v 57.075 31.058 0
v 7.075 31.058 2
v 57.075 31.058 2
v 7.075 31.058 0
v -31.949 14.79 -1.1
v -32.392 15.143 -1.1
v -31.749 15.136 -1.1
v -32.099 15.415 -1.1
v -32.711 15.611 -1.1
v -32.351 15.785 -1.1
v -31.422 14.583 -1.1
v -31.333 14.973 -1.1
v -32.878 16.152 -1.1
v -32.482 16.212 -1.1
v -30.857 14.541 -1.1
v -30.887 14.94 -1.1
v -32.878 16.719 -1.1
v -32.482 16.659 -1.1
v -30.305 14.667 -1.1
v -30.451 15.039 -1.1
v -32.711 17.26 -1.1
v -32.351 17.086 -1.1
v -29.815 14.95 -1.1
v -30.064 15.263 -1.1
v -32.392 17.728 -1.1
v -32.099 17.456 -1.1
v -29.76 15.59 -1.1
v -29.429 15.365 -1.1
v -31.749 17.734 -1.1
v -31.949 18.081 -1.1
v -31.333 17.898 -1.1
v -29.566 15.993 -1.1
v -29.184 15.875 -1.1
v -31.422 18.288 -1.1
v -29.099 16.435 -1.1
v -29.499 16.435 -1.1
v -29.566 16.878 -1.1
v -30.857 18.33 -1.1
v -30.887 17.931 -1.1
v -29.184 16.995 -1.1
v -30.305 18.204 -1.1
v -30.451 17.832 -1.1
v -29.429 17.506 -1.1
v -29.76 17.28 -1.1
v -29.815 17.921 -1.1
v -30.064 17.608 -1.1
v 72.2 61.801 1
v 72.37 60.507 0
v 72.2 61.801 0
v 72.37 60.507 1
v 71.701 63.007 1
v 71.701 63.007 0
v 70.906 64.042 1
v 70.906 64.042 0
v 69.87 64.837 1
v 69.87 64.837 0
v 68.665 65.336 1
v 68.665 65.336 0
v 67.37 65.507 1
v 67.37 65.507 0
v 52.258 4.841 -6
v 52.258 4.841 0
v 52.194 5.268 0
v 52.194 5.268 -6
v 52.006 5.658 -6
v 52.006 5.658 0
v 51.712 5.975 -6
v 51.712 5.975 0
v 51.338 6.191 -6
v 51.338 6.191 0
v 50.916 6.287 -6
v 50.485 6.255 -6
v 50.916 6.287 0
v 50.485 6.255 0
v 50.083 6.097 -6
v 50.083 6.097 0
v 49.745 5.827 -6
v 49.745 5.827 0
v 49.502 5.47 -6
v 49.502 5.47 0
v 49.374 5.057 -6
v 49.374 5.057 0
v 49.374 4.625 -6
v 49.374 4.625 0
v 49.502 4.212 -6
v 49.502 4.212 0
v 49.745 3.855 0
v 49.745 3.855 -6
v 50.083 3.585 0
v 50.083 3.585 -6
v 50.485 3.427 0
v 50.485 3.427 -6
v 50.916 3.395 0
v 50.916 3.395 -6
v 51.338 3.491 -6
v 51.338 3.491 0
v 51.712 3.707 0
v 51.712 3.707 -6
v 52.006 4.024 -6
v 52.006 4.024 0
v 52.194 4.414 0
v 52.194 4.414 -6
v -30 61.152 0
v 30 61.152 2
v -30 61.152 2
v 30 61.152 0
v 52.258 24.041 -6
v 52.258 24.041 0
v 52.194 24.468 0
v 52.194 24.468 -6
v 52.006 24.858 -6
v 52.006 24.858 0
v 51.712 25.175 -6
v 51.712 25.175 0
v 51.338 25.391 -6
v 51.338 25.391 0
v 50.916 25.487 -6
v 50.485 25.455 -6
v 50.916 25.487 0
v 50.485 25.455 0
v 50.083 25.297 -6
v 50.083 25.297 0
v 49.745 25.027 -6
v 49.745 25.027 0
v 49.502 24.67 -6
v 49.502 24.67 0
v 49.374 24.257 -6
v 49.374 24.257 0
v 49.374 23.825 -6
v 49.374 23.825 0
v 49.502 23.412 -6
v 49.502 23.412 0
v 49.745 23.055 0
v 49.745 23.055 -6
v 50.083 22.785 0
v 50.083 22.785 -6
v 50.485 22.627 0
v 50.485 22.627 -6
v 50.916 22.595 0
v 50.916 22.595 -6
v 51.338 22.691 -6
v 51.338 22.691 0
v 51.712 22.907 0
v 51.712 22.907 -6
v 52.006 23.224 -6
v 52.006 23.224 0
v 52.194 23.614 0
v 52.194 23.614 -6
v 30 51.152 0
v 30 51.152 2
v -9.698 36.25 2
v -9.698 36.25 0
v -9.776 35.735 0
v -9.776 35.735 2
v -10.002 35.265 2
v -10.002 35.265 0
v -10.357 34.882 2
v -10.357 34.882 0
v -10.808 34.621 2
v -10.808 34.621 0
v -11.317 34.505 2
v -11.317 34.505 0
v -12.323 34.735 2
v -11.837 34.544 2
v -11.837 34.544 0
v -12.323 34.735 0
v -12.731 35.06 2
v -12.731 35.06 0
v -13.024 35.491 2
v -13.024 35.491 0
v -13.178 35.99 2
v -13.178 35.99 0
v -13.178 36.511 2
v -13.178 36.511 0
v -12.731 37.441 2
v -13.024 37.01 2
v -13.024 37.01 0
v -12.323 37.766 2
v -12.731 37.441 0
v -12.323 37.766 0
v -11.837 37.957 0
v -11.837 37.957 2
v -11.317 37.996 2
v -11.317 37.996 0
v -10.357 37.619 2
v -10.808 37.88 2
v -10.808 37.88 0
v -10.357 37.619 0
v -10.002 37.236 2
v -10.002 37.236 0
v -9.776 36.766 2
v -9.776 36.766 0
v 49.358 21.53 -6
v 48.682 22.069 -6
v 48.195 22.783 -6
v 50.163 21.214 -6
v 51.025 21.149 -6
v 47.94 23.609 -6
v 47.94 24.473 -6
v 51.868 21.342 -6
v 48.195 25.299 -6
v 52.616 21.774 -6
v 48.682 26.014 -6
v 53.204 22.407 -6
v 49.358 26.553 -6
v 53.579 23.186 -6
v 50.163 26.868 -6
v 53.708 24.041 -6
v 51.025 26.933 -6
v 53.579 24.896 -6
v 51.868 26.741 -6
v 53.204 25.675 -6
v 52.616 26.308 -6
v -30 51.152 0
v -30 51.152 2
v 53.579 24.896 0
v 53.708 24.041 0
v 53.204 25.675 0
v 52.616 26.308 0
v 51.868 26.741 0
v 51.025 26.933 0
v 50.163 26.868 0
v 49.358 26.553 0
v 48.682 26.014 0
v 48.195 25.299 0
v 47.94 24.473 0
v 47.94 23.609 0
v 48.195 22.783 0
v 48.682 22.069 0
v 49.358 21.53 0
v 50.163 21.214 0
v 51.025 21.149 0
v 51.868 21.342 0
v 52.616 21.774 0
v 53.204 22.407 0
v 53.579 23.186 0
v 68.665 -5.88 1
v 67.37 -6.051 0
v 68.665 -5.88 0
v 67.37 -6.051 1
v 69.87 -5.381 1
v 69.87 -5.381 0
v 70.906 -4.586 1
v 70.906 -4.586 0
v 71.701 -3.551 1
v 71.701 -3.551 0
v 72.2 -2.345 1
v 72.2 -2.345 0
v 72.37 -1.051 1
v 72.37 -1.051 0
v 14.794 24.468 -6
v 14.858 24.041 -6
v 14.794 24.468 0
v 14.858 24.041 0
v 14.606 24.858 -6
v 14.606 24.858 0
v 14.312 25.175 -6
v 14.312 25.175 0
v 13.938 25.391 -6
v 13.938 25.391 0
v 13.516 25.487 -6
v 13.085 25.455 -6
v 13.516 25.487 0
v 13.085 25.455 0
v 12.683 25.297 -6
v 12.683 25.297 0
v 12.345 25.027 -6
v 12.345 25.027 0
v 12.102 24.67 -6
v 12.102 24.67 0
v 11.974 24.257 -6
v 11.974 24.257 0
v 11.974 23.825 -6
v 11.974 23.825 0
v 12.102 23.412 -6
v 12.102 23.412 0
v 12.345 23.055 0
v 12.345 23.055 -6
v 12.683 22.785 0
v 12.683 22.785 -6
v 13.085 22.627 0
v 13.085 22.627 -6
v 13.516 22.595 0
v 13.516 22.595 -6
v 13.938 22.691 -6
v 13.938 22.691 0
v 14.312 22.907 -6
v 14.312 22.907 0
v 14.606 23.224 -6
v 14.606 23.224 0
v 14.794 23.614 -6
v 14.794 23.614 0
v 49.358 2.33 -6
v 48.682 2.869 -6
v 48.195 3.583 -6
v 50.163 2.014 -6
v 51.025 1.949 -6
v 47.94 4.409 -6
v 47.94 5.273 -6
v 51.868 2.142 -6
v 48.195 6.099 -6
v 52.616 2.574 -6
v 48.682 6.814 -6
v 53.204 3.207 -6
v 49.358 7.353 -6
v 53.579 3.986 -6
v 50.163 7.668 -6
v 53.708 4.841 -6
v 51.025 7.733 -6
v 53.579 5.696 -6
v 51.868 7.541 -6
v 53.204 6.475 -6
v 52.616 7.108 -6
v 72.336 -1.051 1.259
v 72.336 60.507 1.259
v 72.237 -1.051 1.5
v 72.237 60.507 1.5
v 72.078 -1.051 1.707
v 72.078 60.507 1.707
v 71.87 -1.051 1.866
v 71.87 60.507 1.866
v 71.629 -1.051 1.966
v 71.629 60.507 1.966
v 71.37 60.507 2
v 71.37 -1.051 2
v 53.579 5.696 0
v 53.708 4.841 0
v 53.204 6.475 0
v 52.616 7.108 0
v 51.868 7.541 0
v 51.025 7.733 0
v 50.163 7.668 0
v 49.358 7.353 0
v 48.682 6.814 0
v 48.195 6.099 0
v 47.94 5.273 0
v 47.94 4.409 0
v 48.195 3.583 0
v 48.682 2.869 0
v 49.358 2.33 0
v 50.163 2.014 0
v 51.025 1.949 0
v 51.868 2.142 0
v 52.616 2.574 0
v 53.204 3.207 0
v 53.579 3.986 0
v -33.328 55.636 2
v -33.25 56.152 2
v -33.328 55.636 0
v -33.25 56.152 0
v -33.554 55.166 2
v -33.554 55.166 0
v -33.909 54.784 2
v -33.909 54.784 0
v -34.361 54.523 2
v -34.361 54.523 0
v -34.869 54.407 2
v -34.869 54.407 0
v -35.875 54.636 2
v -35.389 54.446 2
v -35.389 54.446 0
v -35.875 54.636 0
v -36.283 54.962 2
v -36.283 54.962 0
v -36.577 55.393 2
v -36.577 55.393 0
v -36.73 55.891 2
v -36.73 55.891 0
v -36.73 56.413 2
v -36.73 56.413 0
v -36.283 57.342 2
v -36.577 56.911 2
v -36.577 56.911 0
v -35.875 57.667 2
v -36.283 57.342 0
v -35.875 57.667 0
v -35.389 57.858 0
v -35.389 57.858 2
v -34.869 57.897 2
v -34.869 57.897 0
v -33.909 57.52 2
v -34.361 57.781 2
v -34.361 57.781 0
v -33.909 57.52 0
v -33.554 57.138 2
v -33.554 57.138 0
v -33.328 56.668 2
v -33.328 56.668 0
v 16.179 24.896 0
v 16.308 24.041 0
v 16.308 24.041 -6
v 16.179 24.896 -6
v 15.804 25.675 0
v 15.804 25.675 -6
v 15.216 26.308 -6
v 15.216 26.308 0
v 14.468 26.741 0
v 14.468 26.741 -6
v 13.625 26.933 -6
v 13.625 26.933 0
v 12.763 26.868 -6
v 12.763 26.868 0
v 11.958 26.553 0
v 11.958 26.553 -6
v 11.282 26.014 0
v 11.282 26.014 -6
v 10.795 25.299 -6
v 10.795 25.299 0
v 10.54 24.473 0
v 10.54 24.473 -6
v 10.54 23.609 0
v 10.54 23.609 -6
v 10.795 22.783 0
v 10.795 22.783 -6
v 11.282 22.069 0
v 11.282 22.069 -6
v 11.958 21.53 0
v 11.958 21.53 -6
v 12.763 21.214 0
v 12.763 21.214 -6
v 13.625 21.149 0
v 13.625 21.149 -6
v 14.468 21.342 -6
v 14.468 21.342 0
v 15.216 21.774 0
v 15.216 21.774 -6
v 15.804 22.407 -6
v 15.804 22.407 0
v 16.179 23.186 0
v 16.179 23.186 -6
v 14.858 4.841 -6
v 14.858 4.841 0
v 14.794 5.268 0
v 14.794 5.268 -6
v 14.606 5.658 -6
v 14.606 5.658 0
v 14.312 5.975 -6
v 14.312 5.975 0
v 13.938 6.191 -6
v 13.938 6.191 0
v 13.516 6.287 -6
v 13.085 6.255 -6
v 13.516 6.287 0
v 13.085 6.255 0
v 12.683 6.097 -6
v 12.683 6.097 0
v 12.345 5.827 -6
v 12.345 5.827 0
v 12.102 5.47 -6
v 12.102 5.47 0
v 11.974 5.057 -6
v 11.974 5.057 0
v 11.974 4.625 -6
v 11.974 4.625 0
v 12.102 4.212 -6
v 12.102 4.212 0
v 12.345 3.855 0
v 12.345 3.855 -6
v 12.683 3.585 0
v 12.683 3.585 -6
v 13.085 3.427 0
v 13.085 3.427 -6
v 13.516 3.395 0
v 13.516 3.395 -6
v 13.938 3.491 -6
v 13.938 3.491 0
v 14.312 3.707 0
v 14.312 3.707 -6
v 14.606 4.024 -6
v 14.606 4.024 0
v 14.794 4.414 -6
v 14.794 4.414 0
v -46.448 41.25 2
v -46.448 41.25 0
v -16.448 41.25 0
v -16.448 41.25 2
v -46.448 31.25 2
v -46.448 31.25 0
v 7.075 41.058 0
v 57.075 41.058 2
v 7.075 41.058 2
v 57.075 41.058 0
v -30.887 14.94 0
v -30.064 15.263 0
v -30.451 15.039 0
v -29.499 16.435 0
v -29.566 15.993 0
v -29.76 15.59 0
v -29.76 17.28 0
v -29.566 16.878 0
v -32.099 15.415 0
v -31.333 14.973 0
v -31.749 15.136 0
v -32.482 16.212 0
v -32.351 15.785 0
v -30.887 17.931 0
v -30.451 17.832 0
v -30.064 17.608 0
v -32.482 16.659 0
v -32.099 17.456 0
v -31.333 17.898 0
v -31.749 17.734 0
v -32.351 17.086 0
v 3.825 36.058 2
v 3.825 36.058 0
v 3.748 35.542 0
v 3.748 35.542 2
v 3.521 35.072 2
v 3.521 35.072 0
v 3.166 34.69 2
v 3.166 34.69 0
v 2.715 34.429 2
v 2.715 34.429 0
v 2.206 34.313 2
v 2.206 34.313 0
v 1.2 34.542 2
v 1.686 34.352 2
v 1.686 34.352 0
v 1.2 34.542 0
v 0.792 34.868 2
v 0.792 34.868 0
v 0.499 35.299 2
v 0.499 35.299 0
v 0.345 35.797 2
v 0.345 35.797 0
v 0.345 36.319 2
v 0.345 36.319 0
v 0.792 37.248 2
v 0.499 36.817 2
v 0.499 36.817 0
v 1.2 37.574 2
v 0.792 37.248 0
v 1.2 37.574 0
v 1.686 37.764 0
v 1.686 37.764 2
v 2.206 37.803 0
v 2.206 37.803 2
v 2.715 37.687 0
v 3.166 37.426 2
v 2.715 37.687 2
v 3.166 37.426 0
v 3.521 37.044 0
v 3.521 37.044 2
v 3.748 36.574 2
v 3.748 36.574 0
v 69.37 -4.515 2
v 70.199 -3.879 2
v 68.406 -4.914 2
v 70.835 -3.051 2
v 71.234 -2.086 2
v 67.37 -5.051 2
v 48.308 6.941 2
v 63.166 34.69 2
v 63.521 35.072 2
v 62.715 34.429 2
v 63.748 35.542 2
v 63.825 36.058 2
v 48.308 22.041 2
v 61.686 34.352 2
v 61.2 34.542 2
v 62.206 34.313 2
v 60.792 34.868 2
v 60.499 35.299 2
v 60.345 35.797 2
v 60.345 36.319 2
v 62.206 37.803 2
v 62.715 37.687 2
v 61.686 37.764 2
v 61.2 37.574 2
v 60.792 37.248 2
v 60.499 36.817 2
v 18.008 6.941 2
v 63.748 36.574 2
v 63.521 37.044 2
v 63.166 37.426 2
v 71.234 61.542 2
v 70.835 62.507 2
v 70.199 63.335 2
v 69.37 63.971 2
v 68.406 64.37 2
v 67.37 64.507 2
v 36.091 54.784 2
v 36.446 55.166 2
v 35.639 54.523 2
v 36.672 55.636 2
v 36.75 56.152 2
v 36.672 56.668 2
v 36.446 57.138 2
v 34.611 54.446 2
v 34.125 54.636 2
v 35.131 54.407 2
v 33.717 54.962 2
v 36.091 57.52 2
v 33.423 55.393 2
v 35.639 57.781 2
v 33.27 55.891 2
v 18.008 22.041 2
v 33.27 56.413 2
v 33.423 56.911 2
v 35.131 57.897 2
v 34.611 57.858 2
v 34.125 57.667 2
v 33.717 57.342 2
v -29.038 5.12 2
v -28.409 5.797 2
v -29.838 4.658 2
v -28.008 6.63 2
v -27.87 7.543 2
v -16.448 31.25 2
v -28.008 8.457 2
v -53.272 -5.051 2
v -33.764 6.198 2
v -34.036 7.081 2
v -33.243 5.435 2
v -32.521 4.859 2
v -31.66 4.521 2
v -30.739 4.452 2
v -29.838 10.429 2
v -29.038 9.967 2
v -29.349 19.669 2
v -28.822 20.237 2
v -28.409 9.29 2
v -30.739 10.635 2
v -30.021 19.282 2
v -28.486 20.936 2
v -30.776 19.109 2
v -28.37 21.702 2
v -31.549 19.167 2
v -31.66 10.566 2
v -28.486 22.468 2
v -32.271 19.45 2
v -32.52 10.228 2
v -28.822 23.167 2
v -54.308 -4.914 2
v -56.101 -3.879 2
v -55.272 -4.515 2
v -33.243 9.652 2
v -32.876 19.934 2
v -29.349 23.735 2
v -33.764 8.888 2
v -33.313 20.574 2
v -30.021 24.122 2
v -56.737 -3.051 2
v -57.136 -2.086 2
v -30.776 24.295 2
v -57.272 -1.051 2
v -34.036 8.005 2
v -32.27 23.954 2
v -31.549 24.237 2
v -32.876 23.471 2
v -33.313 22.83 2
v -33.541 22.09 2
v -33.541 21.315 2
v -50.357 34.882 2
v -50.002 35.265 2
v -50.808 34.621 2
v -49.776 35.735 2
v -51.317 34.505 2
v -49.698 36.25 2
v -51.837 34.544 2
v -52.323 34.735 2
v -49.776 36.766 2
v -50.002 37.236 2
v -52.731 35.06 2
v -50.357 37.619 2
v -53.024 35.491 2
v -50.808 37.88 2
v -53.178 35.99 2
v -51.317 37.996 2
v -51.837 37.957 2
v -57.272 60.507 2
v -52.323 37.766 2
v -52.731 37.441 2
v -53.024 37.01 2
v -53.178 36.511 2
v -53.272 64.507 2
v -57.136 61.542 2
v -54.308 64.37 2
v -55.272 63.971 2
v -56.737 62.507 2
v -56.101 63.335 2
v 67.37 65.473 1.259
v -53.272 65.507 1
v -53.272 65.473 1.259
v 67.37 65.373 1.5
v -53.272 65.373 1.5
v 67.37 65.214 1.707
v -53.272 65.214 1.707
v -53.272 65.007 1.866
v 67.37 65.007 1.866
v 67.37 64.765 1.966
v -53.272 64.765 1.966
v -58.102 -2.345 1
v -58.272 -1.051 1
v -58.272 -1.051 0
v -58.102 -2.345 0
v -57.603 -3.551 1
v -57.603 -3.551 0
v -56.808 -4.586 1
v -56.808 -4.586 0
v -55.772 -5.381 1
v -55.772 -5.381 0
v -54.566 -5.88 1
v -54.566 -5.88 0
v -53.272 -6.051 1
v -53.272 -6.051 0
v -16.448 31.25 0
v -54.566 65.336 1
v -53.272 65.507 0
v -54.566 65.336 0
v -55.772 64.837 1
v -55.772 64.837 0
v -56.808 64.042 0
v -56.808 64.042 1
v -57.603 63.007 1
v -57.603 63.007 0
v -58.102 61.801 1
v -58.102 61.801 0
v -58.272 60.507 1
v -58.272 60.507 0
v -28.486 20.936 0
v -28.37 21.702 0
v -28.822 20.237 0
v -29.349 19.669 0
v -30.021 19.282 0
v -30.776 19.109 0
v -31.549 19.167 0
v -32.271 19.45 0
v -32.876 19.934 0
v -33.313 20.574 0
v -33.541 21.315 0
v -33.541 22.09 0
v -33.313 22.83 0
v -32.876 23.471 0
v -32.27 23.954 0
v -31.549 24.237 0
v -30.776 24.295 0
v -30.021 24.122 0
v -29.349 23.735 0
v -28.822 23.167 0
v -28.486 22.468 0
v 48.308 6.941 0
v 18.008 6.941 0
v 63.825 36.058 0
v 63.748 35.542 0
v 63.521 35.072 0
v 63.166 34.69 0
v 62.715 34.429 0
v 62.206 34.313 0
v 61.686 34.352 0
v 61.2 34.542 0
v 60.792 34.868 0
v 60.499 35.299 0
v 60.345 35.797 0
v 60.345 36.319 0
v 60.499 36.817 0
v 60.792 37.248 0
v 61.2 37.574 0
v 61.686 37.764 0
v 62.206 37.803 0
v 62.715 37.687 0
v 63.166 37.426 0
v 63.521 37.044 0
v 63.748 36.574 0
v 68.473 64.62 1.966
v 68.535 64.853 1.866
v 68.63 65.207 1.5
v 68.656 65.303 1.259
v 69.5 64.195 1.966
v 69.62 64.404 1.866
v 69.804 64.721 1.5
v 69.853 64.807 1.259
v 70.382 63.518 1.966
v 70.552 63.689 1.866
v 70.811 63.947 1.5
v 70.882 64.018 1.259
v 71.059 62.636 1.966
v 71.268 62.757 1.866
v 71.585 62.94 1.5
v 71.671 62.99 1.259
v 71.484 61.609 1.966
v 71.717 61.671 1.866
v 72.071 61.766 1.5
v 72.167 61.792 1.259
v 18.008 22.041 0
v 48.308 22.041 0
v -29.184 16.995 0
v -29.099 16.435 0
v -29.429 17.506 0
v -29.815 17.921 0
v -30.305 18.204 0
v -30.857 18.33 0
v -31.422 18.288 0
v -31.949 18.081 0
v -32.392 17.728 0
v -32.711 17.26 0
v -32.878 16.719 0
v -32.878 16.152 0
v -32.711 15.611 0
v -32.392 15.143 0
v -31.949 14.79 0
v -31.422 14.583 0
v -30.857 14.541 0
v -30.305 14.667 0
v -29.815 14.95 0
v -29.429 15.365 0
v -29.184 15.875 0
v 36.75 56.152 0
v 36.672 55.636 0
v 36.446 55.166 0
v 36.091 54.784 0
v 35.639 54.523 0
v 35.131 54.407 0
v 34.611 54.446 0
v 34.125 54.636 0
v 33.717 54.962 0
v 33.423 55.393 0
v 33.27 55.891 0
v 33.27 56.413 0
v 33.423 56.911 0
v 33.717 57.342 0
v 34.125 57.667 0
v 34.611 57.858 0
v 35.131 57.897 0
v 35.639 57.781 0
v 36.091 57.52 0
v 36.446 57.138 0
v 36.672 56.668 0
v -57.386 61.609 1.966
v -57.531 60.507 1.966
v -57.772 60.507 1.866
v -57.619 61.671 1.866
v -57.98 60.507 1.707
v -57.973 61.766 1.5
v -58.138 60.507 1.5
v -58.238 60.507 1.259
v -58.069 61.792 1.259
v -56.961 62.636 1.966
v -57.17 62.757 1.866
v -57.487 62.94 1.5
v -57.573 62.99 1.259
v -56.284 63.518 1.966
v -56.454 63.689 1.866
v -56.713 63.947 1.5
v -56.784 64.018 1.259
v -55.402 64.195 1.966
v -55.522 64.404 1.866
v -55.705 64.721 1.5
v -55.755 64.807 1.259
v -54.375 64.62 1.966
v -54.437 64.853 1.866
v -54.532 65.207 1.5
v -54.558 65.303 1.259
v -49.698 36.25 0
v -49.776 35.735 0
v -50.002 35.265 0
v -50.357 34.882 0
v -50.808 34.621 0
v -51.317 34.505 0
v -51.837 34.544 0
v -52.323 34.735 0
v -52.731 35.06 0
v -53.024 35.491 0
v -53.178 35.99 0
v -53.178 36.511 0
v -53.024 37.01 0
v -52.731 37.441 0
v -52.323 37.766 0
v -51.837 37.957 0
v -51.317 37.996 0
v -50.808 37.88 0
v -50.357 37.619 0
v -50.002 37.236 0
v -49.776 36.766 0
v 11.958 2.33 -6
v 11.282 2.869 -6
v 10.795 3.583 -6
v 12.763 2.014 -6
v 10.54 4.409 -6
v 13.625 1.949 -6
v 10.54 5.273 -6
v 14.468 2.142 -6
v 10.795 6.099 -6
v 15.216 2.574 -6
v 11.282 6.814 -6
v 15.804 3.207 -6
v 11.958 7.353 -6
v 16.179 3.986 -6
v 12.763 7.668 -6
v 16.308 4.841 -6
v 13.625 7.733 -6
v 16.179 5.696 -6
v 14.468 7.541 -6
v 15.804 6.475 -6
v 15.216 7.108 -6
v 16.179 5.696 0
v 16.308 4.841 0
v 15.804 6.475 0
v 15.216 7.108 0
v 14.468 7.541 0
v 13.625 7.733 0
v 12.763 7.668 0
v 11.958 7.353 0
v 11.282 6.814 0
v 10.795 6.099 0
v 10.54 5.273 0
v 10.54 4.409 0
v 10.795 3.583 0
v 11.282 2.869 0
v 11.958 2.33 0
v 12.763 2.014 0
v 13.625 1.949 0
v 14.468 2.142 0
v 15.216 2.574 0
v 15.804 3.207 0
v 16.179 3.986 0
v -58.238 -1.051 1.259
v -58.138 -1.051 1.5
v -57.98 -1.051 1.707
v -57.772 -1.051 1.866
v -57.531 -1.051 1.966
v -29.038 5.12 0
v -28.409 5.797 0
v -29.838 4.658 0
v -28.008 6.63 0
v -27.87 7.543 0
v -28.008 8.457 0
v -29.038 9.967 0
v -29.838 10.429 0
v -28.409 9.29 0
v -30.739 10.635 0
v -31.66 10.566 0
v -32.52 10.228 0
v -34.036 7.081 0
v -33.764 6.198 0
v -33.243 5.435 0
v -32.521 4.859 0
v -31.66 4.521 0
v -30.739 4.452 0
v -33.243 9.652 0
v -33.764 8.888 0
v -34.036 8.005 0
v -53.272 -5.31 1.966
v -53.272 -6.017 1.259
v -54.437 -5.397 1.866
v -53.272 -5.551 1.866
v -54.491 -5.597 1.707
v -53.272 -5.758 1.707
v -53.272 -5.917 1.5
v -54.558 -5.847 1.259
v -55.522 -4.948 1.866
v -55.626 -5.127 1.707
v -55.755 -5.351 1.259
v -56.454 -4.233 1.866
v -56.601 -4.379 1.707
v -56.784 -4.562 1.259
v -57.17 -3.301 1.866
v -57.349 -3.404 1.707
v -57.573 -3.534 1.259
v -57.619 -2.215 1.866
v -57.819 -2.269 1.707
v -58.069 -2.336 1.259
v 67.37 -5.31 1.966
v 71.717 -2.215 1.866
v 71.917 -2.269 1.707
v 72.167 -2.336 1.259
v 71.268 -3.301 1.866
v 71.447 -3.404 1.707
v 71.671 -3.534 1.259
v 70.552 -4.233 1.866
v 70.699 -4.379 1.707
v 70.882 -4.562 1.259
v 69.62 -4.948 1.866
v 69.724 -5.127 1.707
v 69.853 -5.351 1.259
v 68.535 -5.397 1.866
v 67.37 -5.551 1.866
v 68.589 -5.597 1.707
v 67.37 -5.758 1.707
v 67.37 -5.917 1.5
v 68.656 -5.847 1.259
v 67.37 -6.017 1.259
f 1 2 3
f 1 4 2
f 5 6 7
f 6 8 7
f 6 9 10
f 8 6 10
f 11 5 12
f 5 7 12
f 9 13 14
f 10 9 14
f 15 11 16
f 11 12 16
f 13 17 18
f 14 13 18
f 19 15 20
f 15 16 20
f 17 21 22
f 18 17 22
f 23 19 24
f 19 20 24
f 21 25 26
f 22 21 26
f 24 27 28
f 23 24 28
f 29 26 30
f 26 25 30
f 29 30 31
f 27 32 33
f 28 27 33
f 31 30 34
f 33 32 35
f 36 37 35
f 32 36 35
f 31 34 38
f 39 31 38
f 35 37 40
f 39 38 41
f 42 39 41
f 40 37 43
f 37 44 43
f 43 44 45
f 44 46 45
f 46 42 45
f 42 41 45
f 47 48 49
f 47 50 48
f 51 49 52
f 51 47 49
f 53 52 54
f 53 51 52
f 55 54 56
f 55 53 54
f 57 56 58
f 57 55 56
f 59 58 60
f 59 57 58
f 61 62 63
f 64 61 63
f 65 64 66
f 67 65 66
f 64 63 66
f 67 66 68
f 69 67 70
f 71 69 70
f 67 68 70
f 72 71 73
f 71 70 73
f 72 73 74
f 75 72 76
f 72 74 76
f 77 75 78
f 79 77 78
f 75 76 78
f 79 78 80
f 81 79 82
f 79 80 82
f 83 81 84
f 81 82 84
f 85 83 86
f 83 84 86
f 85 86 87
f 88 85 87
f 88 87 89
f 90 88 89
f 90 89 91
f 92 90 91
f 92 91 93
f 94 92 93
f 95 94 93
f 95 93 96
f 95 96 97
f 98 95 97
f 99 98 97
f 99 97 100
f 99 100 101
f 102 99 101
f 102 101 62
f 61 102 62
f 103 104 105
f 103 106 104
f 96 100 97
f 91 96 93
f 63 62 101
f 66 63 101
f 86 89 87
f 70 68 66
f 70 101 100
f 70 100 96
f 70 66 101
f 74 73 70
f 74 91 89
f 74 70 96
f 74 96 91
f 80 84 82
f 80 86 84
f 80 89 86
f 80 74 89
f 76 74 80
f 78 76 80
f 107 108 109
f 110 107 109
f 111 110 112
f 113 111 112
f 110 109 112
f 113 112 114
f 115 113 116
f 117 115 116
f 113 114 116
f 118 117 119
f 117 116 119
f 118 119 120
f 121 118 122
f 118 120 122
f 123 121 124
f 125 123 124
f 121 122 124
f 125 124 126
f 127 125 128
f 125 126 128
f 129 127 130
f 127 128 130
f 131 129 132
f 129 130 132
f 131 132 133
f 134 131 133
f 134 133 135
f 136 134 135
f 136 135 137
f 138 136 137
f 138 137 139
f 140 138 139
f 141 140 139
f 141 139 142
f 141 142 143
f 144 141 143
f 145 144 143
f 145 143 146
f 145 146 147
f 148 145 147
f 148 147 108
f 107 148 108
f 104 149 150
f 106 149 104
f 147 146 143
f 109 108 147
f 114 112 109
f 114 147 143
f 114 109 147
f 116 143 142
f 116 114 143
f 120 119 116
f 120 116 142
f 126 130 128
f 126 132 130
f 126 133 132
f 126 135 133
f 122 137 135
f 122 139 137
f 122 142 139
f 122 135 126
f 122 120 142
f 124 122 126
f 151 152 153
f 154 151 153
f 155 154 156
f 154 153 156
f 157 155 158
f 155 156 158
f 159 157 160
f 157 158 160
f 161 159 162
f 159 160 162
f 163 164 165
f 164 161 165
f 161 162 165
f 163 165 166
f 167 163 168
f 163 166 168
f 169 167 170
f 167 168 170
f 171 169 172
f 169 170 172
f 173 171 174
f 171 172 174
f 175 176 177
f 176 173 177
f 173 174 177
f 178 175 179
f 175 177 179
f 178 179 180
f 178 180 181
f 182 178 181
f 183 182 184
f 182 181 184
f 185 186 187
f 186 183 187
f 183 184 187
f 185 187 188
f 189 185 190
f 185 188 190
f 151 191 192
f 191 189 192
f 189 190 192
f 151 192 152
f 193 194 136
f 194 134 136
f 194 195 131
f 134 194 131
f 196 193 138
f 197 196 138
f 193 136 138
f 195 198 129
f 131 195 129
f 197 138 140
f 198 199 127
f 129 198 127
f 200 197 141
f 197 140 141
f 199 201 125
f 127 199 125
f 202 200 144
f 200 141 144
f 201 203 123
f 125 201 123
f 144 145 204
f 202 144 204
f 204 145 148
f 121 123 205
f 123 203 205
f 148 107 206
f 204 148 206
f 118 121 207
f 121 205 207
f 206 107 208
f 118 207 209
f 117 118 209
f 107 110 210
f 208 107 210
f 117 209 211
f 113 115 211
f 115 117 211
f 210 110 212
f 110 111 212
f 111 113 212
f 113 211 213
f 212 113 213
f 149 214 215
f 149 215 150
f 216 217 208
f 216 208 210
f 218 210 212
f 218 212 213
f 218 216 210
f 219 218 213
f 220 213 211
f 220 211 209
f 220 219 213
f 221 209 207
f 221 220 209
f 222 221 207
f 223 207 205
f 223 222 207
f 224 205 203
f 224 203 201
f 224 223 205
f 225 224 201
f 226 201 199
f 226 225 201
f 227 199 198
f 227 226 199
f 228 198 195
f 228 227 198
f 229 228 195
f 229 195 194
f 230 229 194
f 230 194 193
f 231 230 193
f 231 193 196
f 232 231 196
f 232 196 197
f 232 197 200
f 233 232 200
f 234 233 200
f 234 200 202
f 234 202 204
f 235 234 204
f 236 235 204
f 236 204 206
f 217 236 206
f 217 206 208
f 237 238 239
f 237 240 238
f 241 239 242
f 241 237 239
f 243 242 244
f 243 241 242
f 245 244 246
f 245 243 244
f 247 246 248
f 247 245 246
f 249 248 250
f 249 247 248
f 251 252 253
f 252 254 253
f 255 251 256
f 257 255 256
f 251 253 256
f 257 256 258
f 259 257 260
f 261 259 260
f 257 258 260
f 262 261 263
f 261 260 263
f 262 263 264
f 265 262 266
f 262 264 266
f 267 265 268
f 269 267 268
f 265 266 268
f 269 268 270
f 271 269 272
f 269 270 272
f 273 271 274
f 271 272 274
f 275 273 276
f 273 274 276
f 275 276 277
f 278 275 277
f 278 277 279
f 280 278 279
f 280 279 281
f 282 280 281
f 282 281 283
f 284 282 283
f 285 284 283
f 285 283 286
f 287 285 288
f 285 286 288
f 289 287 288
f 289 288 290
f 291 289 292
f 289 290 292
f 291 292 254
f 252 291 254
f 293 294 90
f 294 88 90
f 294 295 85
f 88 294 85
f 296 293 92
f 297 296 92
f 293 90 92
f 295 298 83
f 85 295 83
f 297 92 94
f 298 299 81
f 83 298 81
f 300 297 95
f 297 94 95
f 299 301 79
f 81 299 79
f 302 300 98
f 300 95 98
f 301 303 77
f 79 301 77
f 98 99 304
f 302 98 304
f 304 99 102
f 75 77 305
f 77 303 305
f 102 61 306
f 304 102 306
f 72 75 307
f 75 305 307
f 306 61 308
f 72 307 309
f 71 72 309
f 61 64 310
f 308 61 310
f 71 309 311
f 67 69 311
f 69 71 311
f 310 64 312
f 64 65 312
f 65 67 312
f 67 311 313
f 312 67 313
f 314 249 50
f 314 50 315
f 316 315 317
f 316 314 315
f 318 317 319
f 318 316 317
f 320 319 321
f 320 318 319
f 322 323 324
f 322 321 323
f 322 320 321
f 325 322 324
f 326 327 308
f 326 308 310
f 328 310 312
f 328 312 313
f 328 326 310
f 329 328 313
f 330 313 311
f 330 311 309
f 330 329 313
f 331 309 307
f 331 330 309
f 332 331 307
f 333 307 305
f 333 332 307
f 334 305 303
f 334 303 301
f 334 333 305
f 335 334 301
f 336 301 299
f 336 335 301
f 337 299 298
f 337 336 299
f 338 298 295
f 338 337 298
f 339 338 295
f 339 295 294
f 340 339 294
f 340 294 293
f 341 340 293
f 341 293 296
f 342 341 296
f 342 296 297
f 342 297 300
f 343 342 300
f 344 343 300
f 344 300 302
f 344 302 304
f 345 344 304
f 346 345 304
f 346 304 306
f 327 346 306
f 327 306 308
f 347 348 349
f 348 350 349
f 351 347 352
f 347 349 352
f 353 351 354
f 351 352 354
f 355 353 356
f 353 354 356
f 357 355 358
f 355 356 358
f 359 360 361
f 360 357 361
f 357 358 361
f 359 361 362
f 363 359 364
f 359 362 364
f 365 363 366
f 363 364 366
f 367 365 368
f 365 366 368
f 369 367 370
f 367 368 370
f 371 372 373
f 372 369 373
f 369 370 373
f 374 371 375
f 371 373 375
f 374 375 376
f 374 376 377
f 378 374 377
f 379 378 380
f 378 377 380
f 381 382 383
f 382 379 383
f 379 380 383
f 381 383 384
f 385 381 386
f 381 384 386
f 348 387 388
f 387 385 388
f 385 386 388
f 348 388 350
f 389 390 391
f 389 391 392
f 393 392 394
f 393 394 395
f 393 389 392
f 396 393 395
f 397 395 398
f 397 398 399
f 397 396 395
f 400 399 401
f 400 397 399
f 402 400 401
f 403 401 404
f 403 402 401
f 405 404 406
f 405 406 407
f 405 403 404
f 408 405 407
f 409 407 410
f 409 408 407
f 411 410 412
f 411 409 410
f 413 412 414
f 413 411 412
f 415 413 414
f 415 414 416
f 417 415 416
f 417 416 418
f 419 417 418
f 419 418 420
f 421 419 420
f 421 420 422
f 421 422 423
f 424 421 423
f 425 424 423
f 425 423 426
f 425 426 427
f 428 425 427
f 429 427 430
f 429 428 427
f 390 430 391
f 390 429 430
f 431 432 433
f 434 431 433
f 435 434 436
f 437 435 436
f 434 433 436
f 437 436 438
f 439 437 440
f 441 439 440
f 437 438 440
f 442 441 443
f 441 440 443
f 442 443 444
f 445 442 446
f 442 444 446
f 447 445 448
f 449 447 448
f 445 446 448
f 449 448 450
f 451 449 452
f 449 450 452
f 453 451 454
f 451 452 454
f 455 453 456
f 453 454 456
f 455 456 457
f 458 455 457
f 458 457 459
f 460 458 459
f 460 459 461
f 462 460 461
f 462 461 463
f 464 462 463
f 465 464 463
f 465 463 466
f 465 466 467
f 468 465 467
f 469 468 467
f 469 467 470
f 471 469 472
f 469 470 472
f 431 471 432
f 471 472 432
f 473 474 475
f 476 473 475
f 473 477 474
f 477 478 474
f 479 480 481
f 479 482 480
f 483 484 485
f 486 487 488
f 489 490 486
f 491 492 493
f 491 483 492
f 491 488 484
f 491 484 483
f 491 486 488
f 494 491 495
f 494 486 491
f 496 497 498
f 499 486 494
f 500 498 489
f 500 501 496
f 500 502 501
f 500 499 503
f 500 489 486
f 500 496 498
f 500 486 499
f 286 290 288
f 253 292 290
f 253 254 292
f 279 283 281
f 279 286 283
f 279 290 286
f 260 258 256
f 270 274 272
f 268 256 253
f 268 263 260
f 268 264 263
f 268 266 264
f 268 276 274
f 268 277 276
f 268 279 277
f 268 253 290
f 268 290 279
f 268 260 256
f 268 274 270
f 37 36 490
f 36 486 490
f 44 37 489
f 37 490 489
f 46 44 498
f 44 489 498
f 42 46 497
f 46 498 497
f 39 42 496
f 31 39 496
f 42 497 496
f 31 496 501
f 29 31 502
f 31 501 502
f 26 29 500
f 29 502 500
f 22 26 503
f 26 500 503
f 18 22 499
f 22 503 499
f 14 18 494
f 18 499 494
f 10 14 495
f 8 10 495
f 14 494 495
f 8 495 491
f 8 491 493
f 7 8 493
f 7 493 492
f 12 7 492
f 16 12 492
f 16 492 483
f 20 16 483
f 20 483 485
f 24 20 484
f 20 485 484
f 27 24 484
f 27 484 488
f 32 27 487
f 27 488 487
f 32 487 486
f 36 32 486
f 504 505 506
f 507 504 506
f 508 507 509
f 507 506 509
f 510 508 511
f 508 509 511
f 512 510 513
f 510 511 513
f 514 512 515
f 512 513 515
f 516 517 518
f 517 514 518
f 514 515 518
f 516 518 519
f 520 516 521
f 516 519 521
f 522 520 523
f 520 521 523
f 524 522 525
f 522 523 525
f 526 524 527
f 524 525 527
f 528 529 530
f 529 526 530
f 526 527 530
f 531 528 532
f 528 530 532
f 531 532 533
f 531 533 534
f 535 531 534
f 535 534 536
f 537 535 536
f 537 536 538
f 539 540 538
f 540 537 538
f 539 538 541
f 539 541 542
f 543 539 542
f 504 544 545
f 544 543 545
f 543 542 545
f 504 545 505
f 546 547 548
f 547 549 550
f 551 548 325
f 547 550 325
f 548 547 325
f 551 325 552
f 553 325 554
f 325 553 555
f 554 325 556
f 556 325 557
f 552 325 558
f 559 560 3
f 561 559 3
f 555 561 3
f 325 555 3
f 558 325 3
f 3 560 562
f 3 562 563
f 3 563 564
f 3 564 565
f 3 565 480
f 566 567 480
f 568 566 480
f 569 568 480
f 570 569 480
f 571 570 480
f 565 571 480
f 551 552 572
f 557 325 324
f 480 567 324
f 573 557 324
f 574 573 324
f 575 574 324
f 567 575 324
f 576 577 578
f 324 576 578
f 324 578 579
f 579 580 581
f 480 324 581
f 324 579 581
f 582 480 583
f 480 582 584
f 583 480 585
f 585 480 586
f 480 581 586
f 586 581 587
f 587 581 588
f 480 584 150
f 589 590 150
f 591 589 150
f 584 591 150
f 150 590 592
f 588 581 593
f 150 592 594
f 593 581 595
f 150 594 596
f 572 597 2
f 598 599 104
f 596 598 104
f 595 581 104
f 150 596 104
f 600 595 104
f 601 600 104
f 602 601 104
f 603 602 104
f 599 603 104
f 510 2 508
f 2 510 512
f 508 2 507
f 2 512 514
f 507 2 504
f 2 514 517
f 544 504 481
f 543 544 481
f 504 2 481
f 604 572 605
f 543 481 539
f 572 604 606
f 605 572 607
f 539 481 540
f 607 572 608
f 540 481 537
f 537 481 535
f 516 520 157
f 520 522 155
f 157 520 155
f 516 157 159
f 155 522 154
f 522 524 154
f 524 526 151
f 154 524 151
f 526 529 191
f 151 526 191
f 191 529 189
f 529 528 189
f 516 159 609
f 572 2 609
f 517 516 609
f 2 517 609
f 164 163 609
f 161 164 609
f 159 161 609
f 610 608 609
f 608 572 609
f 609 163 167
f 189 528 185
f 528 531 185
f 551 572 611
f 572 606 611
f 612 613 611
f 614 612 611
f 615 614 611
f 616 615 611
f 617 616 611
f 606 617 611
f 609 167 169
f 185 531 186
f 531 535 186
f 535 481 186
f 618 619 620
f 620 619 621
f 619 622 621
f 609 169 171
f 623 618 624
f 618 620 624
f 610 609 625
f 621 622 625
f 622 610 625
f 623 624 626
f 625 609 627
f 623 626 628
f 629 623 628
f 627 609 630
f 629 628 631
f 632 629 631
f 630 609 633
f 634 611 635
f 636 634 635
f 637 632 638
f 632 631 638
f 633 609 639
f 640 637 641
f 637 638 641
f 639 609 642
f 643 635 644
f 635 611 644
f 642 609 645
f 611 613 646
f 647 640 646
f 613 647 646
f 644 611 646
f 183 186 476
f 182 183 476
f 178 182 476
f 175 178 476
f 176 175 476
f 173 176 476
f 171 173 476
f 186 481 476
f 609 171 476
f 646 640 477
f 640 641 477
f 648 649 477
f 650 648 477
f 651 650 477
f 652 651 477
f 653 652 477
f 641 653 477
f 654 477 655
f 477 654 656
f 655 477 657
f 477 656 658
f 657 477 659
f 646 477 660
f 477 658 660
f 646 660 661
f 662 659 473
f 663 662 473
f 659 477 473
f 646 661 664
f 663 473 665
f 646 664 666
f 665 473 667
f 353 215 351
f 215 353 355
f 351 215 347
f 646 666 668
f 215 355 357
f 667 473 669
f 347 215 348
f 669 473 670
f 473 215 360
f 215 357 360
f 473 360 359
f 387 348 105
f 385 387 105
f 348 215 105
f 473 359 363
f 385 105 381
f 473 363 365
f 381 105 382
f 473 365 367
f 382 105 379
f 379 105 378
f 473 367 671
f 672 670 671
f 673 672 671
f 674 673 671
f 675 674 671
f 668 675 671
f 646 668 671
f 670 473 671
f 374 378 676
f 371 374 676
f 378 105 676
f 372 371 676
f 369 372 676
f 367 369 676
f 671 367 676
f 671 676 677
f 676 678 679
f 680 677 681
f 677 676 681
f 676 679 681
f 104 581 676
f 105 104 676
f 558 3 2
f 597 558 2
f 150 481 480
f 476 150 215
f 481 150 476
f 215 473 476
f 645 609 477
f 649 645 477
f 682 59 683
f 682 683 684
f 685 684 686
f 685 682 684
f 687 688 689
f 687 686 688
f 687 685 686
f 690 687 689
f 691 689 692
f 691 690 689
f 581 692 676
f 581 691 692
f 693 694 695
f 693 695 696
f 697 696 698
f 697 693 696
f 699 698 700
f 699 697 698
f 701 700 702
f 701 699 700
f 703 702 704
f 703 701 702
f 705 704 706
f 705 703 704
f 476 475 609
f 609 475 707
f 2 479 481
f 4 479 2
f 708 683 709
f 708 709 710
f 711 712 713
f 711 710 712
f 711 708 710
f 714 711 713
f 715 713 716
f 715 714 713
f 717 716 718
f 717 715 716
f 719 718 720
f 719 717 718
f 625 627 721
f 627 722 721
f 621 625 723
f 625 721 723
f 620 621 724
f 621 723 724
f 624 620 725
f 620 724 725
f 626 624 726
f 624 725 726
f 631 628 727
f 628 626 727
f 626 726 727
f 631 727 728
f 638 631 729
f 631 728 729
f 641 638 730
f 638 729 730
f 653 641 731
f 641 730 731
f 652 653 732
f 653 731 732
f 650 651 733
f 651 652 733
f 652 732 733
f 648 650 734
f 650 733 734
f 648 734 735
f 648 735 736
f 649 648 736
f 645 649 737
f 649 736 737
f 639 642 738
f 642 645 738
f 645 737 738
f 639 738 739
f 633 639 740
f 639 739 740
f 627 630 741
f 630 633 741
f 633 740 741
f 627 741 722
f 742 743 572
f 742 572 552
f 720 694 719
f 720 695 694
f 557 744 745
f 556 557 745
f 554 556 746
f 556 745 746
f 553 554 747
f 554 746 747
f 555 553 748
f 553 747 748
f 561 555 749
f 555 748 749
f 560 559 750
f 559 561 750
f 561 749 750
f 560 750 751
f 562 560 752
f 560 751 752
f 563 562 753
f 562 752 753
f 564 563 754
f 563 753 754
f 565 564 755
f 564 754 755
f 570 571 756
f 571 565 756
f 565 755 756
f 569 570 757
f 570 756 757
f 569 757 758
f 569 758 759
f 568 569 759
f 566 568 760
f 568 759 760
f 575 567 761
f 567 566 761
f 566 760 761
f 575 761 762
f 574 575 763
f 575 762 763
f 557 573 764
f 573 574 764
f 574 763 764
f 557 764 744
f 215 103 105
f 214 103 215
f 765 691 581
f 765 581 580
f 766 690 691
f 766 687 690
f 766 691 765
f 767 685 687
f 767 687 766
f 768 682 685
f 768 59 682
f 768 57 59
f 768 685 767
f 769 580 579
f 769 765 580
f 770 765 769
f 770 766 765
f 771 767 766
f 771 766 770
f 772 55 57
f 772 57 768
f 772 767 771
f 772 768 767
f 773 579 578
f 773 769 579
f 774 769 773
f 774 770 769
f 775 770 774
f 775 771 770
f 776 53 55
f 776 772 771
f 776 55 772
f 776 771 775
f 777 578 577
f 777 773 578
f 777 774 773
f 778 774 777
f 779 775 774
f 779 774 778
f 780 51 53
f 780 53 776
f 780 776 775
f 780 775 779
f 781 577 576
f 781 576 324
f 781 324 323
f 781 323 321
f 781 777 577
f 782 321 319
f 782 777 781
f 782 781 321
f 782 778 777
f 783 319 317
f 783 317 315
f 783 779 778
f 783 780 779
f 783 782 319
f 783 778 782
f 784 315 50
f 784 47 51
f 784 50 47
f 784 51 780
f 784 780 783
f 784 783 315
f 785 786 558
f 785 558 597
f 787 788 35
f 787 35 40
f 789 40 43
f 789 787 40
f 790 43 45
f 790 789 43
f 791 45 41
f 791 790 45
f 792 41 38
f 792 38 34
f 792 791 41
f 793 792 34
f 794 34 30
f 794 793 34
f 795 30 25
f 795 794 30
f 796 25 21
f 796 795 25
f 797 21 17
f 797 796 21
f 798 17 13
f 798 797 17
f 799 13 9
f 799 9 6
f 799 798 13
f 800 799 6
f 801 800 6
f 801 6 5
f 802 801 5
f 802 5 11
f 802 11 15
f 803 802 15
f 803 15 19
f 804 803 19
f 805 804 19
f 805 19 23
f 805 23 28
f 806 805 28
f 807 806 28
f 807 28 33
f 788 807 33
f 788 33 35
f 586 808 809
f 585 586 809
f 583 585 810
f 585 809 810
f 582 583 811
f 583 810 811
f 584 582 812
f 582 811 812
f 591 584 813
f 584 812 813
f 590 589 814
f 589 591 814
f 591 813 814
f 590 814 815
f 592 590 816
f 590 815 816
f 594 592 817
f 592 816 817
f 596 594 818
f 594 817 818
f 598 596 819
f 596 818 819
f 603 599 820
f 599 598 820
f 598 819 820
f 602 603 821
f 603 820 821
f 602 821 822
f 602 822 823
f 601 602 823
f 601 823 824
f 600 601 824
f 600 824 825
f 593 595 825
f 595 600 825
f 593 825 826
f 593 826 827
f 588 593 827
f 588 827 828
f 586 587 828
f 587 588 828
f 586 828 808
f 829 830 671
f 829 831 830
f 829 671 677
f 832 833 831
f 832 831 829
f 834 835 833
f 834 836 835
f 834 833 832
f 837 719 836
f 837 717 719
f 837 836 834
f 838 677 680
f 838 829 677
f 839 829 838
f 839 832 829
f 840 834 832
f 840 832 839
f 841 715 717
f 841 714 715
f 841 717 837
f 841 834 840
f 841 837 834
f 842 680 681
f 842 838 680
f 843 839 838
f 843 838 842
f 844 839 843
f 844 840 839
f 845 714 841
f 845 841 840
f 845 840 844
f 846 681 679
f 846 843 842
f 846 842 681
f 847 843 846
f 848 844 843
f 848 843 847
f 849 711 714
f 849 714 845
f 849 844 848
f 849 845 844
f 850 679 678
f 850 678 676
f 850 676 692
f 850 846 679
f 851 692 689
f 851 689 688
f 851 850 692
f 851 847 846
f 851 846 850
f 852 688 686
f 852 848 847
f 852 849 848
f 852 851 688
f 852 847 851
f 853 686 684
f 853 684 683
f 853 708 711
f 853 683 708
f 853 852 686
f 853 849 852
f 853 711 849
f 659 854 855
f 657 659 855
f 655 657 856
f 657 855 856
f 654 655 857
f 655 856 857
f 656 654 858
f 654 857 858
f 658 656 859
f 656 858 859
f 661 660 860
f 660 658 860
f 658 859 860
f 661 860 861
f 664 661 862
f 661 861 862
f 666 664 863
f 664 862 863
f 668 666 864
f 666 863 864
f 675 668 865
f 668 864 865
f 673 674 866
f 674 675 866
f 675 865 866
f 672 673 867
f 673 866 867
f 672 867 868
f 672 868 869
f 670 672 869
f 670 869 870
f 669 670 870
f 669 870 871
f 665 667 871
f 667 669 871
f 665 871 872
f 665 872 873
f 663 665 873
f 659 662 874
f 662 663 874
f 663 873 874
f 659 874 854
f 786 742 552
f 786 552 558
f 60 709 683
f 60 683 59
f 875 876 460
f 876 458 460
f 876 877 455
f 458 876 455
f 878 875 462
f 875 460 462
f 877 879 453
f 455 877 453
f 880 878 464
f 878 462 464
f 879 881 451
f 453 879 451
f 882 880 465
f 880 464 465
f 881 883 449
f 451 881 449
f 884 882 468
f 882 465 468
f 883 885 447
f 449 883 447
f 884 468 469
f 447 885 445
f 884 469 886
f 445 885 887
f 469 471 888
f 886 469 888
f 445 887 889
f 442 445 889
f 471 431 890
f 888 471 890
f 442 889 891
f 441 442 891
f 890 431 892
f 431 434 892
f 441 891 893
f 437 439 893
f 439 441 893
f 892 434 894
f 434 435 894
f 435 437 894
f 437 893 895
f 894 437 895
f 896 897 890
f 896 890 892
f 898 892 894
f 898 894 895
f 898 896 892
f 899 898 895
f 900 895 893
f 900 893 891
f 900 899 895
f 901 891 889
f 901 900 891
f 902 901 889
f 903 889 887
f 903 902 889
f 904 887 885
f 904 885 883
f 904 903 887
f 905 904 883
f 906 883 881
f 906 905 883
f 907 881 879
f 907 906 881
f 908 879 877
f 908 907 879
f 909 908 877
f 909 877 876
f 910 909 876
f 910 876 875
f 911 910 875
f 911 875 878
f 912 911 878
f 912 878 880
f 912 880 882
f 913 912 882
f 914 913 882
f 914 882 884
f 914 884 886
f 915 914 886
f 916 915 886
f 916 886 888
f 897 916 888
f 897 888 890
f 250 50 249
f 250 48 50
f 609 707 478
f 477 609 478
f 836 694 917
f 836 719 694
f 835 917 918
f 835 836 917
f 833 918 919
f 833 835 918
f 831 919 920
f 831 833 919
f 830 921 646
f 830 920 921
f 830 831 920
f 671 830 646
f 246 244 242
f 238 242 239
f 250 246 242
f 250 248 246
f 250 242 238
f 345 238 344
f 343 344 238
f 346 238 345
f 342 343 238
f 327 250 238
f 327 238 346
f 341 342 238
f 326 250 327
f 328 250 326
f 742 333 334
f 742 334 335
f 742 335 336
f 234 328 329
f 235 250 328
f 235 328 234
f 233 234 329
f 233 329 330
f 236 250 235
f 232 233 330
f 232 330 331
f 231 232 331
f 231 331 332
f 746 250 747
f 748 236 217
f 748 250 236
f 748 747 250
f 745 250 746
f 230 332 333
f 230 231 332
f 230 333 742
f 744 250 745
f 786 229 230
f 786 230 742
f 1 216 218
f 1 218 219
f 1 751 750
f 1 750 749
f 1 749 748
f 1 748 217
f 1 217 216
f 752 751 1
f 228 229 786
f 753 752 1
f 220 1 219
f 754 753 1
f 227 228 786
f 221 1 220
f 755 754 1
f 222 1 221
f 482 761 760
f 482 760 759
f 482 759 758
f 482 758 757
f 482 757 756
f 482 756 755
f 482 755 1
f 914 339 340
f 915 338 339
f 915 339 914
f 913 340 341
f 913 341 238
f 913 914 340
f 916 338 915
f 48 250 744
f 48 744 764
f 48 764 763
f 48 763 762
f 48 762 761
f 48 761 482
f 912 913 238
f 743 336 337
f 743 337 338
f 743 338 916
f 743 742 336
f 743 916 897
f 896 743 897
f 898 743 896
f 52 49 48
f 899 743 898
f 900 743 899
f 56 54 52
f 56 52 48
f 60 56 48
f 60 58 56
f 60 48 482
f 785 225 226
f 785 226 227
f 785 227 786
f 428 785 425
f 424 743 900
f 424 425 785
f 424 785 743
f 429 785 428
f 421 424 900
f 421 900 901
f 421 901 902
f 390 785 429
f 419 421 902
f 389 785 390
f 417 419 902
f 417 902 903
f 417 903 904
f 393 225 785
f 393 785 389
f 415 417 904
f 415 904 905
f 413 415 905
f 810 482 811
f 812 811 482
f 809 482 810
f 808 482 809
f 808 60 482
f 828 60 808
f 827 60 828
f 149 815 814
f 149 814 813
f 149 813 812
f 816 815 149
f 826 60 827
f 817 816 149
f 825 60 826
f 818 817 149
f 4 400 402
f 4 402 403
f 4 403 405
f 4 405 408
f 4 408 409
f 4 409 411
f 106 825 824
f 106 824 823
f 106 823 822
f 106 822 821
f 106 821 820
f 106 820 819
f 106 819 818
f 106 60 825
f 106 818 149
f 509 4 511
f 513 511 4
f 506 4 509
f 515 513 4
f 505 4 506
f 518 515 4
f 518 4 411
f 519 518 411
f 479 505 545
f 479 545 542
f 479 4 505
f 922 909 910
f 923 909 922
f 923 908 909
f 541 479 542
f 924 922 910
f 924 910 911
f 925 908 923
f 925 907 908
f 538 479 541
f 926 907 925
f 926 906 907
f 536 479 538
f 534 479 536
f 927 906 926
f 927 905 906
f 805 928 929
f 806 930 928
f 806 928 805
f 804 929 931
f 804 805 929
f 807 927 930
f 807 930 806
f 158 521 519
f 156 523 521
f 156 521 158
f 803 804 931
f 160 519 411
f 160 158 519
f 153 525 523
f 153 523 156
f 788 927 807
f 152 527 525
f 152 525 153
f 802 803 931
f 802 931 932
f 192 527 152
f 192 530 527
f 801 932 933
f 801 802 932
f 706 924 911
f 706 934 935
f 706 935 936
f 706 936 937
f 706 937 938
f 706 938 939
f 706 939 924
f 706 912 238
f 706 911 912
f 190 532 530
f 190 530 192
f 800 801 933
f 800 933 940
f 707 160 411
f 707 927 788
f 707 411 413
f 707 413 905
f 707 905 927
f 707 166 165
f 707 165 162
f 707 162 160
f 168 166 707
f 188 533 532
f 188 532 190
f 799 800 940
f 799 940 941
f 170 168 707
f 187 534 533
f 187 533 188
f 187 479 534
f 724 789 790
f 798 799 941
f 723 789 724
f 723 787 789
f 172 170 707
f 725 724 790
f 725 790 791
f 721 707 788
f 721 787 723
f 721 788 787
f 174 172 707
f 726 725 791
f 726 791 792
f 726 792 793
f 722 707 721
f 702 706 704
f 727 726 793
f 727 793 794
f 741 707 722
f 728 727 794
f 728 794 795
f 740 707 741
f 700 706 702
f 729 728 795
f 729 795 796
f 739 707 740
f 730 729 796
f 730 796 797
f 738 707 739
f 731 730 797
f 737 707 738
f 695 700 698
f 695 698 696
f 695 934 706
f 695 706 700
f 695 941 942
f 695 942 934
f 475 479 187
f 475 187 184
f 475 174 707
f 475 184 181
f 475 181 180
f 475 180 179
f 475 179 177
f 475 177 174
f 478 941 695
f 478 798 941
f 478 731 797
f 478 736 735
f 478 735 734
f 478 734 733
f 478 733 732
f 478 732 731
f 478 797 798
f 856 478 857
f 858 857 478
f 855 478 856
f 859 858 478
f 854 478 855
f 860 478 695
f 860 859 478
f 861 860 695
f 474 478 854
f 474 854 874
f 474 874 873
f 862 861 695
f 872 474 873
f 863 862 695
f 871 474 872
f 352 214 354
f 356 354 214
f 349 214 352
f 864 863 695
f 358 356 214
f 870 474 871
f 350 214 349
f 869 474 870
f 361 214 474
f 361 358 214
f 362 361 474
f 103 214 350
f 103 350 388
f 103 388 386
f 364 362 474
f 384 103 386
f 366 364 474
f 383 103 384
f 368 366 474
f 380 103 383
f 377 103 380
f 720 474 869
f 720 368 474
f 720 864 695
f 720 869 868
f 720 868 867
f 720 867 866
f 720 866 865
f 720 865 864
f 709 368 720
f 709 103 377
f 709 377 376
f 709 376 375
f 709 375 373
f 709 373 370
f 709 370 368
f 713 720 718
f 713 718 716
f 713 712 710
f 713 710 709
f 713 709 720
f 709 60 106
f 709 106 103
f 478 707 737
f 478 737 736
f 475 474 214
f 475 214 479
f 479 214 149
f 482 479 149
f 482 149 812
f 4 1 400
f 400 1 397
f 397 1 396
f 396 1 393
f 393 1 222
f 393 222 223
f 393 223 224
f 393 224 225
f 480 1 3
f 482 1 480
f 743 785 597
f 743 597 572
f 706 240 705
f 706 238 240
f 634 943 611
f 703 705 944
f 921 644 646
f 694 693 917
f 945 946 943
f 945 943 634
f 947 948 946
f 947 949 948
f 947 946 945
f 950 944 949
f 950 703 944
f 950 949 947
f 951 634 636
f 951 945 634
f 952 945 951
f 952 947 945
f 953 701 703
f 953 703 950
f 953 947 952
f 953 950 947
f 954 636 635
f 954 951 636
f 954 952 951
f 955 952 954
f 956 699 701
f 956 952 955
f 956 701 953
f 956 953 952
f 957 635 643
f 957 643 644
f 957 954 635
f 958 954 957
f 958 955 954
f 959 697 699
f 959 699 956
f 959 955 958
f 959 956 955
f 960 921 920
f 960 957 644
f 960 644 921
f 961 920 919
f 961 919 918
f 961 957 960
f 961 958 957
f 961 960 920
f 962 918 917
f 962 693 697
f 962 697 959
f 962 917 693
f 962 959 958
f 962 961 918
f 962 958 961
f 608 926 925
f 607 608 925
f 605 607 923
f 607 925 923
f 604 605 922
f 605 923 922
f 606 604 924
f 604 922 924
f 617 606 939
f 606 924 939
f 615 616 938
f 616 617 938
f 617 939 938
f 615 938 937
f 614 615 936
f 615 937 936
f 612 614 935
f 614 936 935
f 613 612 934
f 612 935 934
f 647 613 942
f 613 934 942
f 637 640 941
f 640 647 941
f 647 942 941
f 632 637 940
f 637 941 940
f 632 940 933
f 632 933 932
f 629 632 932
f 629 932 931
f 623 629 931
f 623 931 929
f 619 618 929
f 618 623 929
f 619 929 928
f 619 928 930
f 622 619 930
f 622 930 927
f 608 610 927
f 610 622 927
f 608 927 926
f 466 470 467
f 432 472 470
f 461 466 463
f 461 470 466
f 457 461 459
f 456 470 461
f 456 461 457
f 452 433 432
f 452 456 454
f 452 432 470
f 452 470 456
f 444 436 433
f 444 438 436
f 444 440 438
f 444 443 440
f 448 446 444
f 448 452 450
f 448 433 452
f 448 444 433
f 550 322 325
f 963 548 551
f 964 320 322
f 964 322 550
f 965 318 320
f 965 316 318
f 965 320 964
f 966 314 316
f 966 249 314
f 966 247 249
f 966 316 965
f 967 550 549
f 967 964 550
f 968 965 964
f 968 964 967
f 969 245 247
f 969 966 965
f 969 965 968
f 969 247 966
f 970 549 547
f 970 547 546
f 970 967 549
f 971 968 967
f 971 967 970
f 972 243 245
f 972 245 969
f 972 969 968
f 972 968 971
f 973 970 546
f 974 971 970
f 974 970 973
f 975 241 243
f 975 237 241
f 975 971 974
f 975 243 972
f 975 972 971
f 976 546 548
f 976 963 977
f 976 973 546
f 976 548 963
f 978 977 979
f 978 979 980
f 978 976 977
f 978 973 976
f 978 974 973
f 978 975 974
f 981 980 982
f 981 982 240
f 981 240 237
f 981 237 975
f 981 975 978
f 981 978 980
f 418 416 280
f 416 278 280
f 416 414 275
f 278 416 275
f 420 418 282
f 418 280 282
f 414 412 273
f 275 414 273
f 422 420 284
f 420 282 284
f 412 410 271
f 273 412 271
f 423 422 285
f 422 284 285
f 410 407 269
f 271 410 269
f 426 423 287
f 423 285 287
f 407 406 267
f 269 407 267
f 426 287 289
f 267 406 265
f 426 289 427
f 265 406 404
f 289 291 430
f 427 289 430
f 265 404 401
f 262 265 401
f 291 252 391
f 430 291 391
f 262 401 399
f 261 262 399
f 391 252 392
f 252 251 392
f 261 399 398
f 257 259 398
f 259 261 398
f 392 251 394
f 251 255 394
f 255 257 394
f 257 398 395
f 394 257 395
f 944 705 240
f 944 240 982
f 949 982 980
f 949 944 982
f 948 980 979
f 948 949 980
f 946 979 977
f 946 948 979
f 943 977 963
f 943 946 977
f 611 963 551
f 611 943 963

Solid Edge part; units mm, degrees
sketch "Sketch1" plane through (0, 0, 0) normal (0, 0, 1) x (1, 0, 0)
  circle A0 centre (-30.9705, 21.7021) radius 2.6
  line L0 (-16.4478, 31.2505) -> (-46.4478, 31.2505)
  line L1 (-46.4478, 31.2505) -> (-46.4478, 41.2505)
  line L2 (-46.4478, 41.2505) -> (-16.4478, 41.2505)
  line L3 (-16.4478, 41.2505) -> (-16.4478, 31.2505)
  circle A1 centre (-30.9705, 7.5433) radius 3.1
  circle A2 centre (50.8081, 24.0411) radius 2.9
  line L4 (72.3705, -6.0507) -> (-58.2724, -6.0507)
  line L5 (-58.2724, -6.0507) -> (-58.2724, 65.5066)
  line L6 (-58.2724, 65.5066) -> (72.3705, 65.5066)
  line L7 (72.3705, 65.5066) -> (72.3705, -6.0507)
  line L8 (30, 61.1519) -> (-30, 61.1519)
  line L9 (-30, 61.1519) -> (-30, 51.1519)
  line L10 (-30, 51.1519) -> (30, 51.1519)
  line L11 (30, 51.1519) -> (30, 61.1519)
  line L12 (57.0753, 31.058) -> (57.0753, 41.058)
  line L13 (57.0753, 41.058) -> (7.0753, 41.058)
  line L14 (7.0753, 41.058) -> (7.0753, 31.058)
  line L15 (7.0753, 31.058) -> (57.0753, 31.058)
  circle A3 centre (62.0753, 36.058) radius 1.75
  circle A4 centre (35, 56.1519) radius 1.75
  circle A5 centre (-51.4478, 36.2505) radius 1.75
  circle A6 centre (-35, 56.1519) radius 1.75
  circle A7 centre (2.0753, 36.058) radius 1.75
  circle A8 centre (-11.4478, 36.2505) radius 1.75
  circle A9 centre (13.4081, 4.8411) radius 2.9
  line L16 (48.3081, 6.9411) -> (48.3081, 22.0411)
  line L17 (48.3081, 22.0411) -> (18.0081, 22.0411)
  line L18 (18.0081, 22.0411) -> (18.0081, 6.9411)
  line L19 (18.0081, 6.9411) -> (48.3081, 6.9411)
  circle A10 centre (13.4081, 24.0411) radius 2.9
  circle A11 centre (50.8081, 4.8411) radius 2.9
  dimension "D1" = 60
  dimension "D2" = 10
  dimension "D3" = 10
  dimension "D4" = 30
  dimension "D5" = 10
  dimension "D6" = 50
  dimension "D7" = 5
  dimension "D8" = 5
  dimension "D9" = 5
  dimension "D10" = 5
  dimension "D11" = 5
  dimension "D12" = 5
  dimension "D13" = 2.9
  dimension "D14" = 2.9
  dimension "D15" = 2.5
extrude "Protrusion1" add sketch "Sketch1" along normal blind 2
fillet "Round_1" [suppressed]
fillet "Round_2" [suppressed]
sketch "Sketch2" plane through (0, 0, 0) normal (0, 0, 1) x (1, 0, 0)
  circle A0 centre (-30.9992, 16.4354) radius 1.5
  circle A1 centre (-30.9992, 16.4354) radius 1.9
  dimension "D1" = 60
  dimension "D2" = 10
  dimension "D3" = 10
  dimension "D4" = 30
  dimension "D5" = 10
  dimension "D6" = 50
  dimension "D7" = 5
  dimension "D8" = 5
  dimension "D9" = 5
  dimension "D10" = 5
  dimension "D11" = 5
  dimension "D12" = 5
  dimension "D13" = 2.9
  dimension "D14" = 2.9
  dimension "D15" = 2.5
extrude "ExtrudedProtrusion_3" add sketch "Sketch2" against normal blind 1.1
fillet "Round_3" radius 5 4 edges at (-58.2724, -6.0507, 1) (-58.2724, 65.5066, 1) (72.3705, -6.0507, 1) (72.3705, 65.5066, 1)
fillet "Round_4" radius 1 8 edges at (7.049, 65.5066, 2) (70.906, 64.0422, 2) (72.3705, 29.7279, 2) (70.906, -4.5863, 2) (7.049, -6.0507, 2) (-56.8079, -4.5863, 2) (-58.2724, 29.7279, 2) (-56.8079, 64.0422, 2)
sketch "Sketch3" plane through (0, 0, 0) normal (0, 0, 1) x (1, 0, 0)
  circle A0 centre (50.8081, 4.8411) radius 2.9
  circle A1 centre (13.4081, 4.8411) radius 2.9
  circle A2 centre (13.4081, 24.0411) radius 2.9
  circle A3 centre (50.8081, 24.0411) radius 2.9
  dimension "D1" = 60
  dimension "D2" = 10
  dimension "D3" = 10
  dimension "D4" = 30
  dimension "D5" = 10
  dimension "D6" = 50
  dimension "D7" = 5
  dimension "D8" = 5
  dimension "D9" = 5
  dimension "D10" = 5
  dimension "D11" = 5
  dimension "D12" = 5
  dimension "D13" = 2.9
  dimension "D14" = 2.9
  dimension "D15" = 2.5
extrude "ExtrudedProtrusion_6" add sketch "Sketch3" along normal blind 2
sketch "Sketch4" plane through (0, 0, 0) normal (0, 0, 1) x (1, 0, 0)
  circle A0 centre (50.8081, 24.0411) radius 2.9
  circle A1 centre (50.8081, 24.0411) radius 1.45
  circle A2 centre (50.8081, 4.8411) radius 2.9
  circle A3 centre (50.8081, 4.8411) radius 1.45
  circle A4 centre (13.4081, 4.8411) radius 2.9
  circle A5 centre (13.4081, 4.8411) radius 1.45
  circle A6 centre (13.4081, 24.0411) radius 2.9
  circle A7 centre (13.4081, 24.0411) radius 1.45
  dimension "D1" = 60
  dimension "D2" = 10
  dimension "D3" = 10
  dimension "D4" = 30
  dimension "D5" = 10
  dimension "D6" = 50
  dimension "D7" = 5
  dimension "D8" = 5
  dimension "D9" = 5
  dimension "D10" = 5
  dimension "D11" = 5
  dimension "D12" = 5
  dimension "D13" = 2.9
  dimension "D14" = 2.9
  dimension "D15" = 2.5
extrude "ExtrudedProtrusion_7" add sketch "Sketch4" against normal blind 6
